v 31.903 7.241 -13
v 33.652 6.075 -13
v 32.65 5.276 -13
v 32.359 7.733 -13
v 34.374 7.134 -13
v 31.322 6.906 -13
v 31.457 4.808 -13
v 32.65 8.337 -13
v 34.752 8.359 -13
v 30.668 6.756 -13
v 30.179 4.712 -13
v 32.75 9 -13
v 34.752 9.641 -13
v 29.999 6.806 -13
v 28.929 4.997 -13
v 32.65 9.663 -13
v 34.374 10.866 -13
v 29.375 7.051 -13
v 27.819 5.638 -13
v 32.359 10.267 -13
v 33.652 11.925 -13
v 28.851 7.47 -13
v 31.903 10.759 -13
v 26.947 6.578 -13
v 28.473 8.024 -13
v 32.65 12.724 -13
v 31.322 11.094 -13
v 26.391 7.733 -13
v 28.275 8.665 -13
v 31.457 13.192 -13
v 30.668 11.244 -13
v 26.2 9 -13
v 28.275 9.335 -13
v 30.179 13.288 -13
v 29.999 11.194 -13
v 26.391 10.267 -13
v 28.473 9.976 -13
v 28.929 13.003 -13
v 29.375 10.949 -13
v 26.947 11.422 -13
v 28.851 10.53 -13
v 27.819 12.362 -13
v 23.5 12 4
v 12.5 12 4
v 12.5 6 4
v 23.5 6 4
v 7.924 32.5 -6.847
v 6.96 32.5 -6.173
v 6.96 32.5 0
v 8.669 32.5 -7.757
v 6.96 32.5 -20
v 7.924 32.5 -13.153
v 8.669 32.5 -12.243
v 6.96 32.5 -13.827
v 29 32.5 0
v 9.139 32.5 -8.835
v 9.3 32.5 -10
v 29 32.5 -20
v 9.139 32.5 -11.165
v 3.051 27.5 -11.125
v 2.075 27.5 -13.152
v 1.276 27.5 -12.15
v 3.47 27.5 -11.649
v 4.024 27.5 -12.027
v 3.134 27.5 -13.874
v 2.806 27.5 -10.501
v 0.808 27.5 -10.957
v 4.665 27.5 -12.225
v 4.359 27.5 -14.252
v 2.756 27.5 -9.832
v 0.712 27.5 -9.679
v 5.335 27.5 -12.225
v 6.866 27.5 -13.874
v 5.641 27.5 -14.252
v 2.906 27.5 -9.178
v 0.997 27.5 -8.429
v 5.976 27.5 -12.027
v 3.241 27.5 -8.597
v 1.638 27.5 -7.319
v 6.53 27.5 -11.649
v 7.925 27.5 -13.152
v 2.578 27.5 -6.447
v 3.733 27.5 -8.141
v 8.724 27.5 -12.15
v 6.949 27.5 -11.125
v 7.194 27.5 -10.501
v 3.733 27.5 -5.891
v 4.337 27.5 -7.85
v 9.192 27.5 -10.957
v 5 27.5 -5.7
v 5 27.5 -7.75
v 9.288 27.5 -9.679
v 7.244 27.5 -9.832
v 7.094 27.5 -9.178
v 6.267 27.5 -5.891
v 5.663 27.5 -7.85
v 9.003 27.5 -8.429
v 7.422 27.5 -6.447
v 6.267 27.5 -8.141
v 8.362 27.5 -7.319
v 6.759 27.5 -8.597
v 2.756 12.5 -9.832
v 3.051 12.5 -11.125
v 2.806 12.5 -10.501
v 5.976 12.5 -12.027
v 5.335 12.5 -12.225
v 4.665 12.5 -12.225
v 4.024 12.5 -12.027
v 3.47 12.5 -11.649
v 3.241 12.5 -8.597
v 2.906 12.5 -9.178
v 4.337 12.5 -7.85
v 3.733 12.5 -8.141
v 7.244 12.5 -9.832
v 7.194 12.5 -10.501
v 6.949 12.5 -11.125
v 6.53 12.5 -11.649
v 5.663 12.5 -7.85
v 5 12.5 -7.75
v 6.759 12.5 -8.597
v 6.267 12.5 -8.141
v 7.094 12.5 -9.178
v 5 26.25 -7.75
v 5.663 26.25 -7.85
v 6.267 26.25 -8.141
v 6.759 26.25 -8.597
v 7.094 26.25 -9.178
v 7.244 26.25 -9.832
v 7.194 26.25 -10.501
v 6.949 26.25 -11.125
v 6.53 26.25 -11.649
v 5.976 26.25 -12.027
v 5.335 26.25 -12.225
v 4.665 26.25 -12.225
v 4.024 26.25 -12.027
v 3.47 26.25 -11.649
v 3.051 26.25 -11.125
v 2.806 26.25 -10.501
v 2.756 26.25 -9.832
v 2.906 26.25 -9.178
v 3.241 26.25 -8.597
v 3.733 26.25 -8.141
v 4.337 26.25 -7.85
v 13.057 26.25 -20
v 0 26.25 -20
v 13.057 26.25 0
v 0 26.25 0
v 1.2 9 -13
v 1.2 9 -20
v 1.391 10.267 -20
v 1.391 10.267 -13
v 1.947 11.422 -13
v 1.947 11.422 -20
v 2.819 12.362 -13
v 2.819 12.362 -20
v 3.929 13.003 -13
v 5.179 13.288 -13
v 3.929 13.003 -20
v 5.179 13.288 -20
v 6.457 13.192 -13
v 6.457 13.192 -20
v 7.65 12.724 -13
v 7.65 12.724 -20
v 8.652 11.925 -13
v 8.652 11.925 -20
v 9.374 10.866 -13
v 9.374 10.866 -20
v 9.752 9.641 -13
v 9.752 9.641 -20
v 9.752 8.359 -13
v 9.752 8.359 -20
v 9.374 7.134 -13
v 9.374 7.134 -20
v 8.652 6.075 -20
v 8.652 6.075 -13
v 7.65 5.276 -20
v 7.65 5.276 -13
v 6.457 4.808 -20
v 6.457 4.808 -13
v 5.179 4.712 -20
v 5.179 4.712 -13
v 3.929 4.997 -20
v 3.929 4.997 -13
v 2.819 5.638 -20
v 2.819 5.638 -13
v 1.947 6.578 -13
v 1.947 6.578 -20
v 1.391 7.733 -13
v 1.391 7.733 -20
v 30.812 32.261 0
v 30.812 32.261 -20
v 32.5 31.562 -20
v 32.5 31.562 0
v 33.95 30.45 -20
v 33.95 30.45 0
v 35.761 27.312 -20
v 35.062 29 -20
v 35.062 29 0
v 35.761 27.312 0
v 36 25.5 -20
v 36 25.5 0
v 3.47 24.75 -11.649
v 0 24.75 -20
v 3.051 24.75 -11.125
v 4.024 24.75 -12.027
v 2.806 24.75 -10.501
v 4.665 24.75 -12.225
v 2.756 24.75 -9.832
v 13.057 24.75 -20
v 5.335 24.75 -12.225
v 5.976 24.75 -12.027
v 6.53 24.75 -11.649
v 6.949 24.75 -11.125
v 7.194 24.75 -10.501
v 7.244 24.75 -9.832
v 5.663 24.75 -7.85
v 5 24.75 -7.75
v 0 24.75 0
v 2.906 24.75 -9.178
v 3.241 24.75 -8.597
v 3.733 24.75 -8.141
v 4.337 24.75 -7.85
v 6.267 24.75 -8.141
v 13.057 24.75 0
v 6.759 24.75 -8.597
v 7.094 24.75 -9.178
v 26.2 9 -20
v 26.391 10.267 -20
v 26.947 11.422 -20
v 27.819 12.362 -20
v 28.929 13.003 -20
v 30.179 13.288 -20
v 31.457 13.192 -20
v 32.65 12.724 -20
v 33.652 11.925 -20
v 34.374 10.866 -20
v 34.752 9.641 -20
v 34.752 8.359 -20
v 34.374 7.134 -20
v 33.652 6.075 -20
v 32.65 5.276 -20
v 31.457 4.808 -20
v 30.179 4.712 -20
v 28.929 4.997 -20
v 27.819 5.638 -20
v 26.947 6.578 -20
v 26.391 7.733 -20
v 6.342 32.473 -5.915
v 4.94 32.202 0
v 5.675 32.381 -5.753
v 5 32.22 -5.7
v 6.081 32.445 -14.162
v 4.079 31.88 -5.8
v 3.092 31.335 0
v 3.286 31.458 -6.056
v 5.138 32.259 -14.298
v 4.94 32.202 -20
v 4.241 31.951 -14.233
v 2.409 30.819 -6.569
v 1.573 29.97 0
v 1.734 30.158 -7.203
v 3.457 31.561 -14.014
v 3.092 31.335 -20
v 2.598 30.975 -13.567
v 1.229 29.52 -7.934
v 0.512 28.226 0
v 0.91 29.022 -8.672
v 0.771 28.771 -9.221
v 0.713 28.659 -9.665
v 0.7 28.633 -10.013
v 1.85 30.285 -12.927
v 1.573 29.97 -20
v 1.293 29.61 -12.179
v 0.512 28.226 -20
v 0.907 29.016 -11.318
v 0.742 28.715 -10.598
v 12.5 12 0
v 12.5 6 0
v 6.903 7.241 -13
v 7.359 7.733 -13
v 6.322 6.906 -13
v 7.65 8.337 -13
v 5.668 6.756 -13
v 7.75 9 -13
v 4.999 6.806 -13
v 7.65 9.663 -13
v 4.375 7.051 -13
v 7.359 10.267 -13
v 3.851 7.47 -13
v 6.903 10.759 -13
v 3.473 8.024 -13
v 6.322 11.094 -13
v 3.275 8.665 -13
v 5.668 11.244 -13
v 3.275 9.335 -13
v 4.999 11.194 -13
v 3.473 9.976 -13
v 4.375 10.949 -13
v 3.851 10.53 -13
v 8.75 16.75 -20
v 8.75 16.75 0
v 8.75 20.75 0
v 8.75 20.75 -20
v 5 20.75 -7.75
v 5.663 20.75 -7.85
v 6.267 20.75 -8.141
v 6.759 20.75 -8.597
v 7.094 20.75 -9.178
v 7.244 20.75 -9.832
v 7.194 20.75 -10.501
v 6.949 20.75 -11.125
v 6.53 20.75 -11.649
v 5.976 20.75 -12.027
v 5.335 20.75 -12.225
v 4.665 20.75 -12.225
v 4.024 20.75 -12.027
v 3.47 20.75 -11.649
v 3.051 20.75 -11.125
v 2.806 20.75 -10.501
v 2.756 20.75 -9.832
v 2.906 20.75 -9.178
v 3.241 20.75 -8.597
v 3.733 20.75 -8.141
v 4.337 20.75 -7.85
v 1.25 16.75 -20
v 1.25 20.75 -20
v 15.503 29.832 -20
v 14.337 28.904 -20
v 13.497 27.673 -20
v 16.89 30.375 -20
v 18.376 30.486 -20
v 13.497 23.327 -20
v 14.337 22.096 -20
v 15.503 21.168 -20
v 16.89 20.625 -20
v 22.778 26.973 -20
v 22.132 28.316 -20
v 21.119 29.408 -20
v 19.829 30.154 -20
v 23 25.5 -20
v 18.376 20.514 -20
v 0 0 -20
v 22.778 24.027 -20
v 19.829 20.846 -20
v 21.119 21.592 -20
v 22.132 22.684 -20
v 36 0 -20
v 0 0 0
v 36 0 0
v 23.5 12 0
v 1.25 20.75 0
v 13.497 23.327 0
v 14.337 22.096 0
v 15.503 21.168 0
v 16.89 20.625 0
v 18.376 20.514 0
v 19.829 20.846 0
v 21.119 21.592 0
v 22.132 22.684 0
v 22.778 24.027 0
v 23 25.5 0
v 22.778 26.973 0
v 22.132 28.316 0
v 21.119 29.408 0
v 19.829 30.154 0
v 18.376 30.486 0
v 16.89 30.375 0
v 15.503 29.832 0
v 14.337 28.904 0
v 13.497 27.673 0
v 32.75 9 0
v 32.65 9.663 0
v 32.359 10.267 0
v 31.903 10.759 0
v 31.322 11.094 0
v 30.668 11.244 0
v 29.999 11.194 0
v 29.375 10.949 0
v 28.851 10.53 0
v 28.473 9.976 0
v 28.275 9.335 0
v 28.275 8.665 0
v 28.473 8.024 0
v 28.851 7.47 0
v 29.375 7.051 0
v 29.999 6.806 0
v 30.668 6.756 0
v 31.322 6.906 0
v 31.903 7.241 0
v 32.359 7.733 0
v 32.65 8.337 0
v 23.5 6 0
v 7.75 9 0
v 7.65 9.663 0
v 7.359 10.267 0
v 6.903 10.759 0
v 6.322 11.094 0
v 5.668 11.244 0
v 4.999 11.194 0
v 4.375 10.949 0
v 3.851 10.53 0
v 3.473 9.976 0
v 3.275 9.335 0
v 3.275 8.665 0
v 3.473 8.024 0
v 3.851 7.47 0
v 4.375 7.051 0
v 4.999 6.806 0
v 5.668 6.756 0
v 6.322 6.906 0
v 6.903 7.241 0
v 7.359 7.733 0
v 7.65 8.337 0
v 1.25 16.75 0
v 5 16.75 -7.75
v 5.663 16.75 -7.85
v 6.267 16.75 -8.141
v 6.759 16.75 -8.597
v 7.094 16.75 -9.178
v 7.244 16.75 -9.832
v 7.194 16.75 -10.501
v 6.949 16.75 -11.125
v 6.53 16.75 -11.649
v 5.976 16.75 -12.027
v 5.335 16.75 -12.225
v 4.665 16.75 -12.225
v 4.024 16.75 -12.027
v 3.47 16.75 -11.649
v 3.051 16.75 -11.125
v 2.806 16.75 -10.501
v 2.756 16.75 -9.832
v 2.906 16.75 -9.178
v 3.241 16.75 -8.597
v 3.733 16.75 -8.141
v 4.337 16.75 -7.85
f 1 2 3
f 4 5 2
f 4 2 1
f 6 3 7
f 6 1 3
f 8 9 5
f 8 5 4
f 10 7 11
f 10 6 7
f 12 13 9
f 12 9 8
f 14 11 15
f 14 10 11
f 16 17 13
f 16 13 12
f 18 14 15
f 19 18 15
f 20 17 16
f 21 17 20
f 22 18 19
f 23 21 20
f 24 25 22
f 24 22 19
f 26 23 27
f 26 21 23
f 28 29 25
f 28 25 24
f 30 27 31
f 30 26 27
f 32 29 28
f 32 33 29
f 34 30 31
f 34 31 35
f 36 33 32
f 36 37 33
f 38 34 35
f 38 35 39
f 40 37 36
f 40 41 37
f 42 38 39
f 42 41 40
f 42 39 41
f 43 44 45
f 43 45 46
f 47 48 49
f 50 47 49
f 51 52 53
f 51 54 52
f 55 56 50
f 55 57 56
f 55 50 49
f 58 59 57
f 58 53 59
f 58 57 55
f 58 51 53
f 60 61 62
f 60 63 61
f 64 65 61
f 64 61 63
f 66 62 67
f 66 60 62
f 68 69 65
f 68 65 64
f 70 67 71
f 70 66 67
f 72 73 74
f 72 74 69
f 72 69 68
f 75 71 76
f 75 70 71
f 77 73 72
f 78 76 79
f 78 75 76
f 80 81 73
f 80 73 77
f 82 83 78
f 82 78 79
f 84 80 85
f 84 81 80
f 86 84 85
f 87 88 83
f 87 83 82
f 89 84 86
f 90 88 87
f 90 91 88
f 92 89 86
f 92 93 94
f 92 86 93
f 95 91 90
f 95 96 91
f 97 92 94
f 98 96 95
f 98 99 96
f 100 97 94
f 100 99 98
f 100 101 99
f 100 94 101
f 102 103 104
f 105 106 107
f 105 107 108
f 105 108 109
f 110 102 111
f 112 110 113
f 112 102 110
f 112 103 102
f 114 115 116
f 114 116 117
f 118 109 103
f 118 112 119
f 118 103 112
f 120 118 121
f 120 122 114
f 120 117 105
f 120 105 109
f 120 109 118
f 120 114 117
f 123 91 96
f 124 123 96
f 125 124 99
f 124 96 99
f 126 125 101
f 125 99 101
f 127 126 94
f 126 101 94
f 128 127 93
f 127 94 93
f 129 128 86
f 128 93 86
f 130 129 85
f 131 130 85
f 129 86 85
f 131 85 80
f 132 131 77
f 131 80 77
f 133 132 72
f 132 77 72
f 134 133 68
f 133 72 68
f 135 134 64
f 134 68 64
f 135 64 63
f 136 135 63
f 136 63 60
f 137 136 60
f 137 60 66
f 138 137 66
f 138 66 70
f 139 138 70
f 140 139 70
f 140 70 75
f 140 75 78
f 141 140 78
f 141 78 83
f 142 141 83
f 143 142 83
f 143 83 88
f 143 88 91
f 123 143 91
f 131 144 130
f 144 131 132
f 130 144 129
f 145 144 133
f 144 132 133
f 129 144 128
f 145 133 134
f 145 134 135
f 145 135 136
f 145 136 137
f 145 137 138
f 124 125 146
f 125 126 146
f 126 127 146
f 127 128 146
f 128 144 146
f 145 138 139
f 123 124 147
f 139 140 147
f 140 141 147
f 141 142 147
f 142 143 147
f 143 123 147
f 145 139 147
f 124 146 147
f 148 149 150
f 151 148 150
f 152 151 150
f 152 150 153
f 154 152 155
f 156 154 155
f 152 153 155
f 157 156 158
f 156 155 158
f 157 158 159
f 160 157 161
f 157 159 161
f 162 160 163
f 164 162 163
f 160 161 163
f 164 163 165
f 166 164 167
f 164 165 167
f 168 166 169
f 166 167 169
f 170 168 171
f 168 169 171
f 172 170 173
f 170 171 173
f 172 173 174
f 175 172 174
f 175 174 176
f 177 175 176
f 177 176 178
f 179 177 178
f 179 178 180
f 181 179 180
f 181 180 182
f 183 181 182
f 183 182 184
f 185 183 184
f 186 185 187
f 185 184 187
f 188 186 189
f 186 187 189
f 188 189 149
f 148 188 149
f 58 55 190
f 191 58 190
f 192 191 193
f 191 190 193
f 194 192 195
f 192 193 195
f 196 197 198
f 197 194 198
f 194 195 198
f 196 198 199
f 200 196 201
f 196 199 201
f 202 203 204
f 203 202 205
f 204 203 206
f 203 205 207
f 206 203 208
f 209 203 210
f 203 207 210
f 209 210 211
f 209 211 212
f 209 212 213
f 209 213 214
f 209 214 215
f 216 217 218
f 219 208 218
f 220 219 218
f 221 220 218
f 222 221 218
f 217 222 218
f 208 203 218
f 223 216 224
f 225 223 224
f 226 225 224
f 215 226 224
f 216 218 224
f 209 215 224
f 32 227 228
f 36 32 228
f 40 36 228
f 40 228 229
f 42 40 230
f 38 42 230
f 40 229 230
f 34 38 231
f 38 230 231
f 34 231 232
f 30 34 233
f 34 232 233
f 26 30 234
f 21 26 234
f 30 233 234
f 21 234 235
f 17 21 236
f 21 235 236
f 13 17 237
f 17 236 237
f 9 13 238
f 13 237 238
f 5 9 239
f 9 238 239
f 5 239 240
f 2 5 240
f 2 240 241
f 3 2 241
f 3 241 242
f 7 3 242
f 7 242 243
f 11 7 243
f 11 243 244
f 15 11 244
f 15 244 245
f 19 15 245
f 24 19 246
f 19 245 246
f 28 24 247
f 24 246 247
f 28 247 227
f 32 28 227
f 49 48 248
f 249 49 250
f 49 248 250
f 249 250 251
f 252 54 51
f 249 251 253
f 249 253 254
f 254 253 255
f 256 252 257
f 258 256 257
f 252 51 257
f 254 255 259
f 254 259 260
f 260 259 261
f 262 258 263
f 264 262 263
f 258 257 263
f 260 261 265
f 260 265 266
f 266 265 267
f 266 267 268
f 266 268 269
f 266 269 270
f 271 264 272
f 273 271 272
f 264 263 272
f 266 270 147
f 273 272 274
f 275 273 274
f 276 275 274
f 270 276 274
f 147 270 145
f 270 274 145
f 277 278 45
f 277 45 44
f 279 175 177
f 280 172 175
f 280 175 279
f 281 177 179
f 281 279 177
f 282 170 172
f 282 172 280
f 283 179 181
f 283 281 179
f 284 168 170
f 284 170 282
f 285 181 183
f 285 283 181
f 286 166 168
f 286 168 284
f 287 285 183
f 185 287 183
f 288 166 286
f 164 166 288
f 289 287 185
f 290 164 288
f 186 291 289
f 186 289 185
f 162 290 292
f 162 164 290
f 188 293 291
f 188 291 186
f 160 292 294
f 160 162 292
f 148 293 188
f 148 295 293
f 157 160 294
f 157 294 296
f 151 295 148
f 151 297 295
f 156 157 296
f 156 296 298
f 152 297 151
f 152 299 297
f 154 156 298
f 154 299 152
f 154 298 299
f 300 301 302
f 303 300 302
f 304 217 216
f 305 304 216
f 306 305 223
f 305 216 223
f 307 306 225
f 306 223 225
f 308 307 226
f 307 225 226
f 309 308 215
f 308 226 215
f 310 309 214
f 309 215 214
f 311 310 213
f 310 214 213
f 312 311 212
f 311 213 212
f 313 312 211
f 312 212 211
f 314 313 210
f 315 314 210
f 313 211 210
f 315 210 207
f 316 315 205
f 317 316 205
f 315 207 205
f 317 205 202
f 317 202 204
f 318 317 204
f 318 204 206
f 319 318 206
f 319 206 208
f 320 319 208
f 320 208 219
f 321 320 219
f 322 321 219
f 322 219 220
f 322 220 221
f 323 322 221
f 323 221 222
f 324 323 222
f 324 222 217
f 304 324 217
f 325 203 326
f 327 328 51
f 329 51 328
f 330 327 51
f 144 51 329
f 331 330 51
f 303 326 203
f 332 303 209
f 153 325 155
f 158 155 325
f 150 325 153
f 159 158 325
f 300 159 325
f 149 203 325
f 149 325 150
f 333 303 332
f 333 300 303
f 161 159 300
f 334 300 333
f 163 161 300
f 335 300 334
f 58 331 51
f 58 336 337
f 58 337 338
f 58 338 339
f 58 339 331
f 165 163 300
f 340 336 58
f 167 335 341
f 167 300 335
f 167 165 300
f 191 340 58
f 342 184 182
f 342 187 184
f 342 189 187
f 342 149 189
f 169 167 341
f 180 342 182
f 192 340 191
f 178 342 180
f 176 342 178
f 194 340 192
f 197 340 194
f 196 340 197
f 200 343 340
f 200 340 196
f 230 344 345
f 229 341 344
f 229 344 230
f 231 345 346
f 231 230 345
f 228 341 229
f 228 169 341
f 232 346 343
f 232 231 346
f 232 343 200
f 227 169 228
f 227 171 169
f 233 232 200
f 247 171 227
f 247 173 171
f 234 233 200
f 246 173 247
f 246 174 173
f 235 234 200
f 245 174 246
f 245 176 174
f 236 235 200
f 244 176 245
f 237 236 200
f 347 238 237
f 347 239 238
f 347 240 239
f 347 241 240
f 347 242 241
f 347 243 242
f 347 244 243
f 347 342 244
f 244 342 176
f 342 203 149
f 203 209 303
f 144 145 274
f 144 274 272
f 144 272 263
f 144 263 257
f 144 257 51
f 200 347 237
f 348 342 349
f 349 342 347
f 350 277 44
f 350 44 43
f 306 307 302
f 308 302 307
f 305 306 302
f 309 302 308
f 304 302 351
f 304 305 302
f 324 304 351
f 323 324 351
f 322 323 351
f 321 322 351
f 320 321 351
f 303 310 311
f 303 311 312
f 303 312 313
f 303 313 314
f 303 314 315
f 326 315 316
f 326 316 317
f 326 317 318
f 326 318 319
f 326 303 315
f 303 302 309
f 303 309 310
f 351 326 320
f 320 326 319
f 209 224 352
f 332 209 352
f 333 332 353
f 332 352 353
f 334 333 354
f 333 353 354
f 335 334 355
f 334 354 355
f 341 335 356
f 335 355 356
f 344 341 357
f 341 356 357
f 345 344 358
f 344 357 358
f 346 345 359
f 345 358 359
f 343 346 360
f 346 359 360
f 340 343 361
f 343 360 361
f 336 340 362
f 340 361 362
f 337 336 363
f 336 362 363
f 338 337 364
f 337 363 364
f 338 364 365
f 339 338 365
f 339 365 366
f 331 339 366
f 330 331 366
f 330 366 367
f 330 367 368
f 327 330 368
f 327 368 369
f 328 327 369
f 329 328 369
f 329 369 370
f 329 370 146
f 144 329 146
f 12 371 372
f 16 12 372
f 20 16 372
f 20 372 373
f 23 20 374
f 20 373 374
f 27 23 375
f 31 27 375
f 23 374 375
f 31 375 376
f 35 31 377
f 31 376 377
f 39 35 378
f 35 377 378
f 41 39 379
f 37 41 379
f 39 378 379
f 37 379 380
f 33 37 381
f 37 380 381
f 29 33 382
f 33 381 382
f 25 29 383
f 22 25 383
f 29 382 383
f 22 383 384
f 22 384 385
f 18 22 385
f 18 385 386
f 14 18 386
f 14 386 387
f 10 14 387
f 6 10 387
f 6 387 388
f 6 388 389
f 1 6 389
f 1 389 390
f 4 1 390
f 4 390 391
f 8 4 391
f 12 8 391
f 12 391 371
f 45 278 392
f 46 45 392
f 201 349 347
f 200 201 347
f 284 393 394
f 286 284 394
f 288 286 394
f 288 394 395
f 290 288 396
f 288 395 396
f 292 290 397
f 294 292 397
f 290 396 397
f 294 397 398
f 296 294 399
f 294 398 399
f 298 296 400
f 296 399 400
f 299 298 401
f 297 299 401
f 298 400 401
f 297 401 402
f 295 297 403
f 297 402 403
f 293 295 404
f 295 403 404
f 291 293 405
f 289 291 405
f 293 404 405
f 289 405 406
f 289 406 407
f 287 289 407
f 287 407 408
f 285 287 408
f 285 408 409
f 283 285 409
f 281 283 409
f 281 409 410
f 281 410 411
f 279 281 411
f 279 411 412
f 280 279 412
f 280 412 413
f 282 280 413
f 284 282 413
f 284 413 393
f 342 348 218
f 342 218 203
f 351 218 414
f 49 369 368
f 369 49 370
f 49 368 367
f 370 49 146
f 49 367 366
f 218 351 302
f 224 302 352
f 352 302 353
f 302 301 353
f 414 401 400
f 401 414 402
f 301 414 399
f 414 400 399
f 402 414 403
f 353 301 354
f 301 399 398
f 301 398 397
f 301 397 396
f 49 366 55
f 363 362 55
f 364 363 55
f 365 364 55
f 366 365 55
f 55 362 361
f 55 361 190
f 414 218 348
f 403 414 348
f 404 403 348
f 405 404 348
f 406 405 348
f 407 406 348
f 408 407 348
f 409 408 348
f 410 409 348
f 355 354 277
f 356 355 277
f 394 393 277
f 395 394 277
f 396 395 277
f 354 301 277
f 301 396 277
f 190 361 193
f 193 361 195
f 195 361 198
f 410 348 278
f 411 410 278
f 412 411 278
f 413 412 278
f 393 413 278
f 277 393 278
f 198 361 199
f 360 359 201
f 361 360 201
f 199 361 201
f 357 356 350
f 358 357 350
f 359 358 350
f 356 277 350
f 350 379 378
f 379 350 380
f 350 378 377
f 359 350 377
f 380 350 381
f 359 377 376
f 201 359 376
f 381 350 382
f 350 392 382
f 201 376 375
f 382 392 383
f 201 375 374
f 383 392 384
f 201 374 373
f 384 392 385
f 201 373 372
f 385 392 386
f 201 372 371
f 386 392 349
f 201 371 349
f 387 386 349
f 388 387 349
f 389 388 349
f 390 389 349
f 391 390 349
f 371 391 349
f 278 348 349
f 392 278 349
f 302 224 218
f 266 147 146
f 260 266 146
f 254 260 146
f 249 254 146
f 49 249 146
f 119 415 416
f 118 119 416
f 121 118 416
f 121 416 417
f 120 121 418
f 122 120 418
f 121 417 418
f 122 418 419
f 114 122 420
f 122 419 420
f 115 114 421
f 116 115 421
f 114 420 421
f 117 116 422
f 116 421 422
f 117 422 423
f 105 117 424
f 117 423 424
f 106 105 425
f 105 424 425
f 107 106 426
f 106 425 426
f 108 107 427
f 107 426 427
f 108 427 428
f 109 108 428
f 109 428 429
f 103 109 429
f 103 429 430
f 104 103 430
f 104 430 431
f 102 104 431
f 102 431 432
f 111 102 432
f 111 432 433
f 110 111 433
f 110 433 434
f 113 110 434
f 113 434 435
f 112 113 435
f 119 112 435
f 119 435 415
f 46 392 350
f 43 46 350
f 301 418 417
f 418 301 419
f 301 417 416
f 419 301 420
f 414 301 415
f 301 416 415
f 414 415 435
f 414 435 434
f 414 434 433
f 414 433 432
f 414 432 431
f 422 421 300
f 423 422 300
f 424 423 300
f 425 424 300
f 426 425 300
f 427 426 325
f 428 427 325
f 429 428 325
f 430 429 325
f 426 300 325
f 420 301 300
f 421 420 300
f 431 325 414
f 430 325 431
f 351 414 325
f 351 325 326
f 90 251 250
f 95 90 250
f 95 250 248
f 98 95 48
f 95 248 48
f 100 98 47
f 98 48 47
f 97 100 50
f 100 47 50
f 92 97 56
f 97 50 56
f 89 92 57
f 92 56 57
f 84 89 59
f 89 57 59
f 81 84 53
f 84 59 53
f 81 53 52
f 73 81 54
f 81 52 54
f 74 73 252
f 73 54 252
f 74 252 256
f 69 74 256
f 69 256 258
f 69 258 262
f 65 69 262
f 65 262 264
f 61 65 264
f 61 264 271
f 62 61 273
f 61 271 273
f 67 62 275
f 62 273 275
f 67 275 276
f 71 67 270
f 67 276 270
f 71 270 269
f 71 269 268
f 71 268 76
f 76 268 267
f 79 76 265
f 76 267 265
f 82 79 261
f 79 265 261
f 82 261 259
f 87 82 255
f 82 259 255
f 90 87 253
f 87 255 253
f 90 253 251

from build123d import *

# Parameters (mm, degrees)
SKETCH_1_W           = 36
SKETCH_1_H           = 20
EXTRUDE_1_DEPTH      = 32.5
SKETCH_4_R           = 5
CUT_EXTRUDE_2_DEPTH  = 47
SKETCH_9_R           = 2.25
CUT_EXTRUDE_7_DEPTH  = 27
SKETCH_10_W          = 11
SKETCH_10_H          = 6
EXTRUDE_2_DEPTH      = 4
SKETCH_11_R          = 2.25
CUT_EXTRUDE_8_DEPTH  = 20
SKETCH_12_R          = 4.3
CUT_EXTRUDE_9_DEPTH  = 5
SKETCH_13_W          = 7.5
SKETCH_13_H          = 4
CUT_EXTRUDE_10_DEPTH = 22
SKETCH_14_R          = 4.3
CUT_EXTRUDE_11_DEPTH = 7
FILLET_1_R           = 7


with BuildPart() as part:
    # Эскиз1 → Бобышка-Вытянуть1 (new body)
    with BuildSketch(Plane(origin=(0, 0, 0), x_dir=(1, 0, 0), z_dir=(0, 1, 0))):
        with Locations((18, 10)):
            Rectangle(SKETCH_1_W, SKETCH_1_H)
    extrude(amount=EXTRUDE_1_DEPTH)

    # Эскиз4 → Вырез-Вытянуть2 (cut)
    with BuildSketch(Plane.XY):
        with Locations((18, 25.5)):
            Circle(SKETCH_4_R)
        with BuildLine():
            ThreePointArc((13.056570017, 24.75), (13, 25.5), (13.056570017, 26.25))
            Line((13.056570017, 26.25), (0, 26.25))
            Line((0, 26.25), (0, 24.75))
            Line((0, 24.75), (13.056570017, 24.75))
        make_face()
    extrude(amount=-CUT_EXTRUDE_2_DEPTH, mode=Mode.SUBTRACT)

    # Эскиз9 → Вырез-Вытянуть7 (cut)
    with BuildSketch(Plane.XY):
        with Locations((30.5, 9)):
            Circle(SKETCH_9_R)
        with Locations((5.5, 9)):
            Circle(SKETCH_9_R)
    extrude(amount=-CUT_EXTRUDE_7_DEPTH, mode=Mode.SUBTRACT)

    # Эскиз10 → Бобышка-Вытянуть2 (add)
    with BuildSketch(Plane.XY):
        with Locations((18, 9)):
            Rectangle(SKETCH_10_W, SKETCH_10_H)
    extrude(amount=EXTRUDE_2_DEPTH)

    # Эскиз11 → Вырез-Вытянуть8 (cut)
    with BuildSketch(Plane(origin=(0, 32.5, 0), x_dir=(1, 0, 0), z_dir=(0, 1, 0))):
        with Locations(Location((5, 10, 0), (0, 0, 270))):
            Circle(SKETCH_11_R)
    extrude(amount=-CUT_EXTRUDE_8_DEPTH, mode=Mode.SUBTRACT)

    # Эскиз12 → Вырез-Вытянуть9 (cut)
    with BuildSketch(Plane(origin=(0, 32.5, 0), x_dir=(1, 0, 0), z_dir=(0, 1, 0))):
        with Locations(Location((5, 10, 0), (0, 0, 270))):
            Circle(SKETCH_12_R)
    extrude(amount=-CUT_EXTRUDE_9_DEPTH, mode=Mode.SUBTRACT)

    # Эскиз13 → Вырез-Вытянуть10 (cut)
    with BuildSketch(Plane(origin=(0, 0, -20), x_dir=(-1, 0, 0), z_dir=(0, 0, -1))):
        with Locations((-5, 18.75)):
            Rectangle(SKETCH_13_W, SKETCH_13_H)
    extrude(amount=-CUT_EXTRUDE_10_DEPTH, mode=Mode.SUBTRACT)

    # Эскиз14 → Вырез-Вытянуть11 (cut)
    with BuildSketch(Plane(origin=(0, 0, -20), x_dir=(-1, 0, 0), z_dir=(0, 0, -1))):
        with Locations((-30.5, 9)):
            Circle(SKETCH_14_R)
        with Locations((-5.5, 9)):
            Circle(SKETCH_14_R)
    extrude(amount=-CUT_EXTRUDE_11_DEPTH, mode=Mode.SUBTRACT)

    # Скругление1
    # the kernel refuses this fillet: 7 mm, written as the material it takes off along each edge
    with BuildSketch(Plane(origin=(36, 32.5, 17.5), x_dir=(0, -1, 0), z_dir=(0, 0, -1))) as fillet_1_piece_1:
        with BuildLine():
            CenterArc((FILLET_1_R, FILLET_1_R), FILLET_1_R, 180, 90)
            Line((0, FILLET_1_R), (0, 0))
            Line((0, 0), (FILLET_1_R, 0))
        make_face()
    extrude(amount=55, mode=Mode.SUBTRACT)
    with BuildSketch(Plane(origin=(0, 32.5, -37.399263634), x_dir=(1, 0, 0), z_dir=(0, 0, 1))) as fillet_1_piece_2:
        with BuildLine():
            CenterArc((6.959705454, -7), FILLET_1_R, 90, 83.849360172)
            Line((0, -6.25), (0, 0))
            Line((0, 0), (6.959705454, 0))
        make_face()
    extrude(amount=54.798527268, mode=Mode.SUBTRACT)


solid = part.part
